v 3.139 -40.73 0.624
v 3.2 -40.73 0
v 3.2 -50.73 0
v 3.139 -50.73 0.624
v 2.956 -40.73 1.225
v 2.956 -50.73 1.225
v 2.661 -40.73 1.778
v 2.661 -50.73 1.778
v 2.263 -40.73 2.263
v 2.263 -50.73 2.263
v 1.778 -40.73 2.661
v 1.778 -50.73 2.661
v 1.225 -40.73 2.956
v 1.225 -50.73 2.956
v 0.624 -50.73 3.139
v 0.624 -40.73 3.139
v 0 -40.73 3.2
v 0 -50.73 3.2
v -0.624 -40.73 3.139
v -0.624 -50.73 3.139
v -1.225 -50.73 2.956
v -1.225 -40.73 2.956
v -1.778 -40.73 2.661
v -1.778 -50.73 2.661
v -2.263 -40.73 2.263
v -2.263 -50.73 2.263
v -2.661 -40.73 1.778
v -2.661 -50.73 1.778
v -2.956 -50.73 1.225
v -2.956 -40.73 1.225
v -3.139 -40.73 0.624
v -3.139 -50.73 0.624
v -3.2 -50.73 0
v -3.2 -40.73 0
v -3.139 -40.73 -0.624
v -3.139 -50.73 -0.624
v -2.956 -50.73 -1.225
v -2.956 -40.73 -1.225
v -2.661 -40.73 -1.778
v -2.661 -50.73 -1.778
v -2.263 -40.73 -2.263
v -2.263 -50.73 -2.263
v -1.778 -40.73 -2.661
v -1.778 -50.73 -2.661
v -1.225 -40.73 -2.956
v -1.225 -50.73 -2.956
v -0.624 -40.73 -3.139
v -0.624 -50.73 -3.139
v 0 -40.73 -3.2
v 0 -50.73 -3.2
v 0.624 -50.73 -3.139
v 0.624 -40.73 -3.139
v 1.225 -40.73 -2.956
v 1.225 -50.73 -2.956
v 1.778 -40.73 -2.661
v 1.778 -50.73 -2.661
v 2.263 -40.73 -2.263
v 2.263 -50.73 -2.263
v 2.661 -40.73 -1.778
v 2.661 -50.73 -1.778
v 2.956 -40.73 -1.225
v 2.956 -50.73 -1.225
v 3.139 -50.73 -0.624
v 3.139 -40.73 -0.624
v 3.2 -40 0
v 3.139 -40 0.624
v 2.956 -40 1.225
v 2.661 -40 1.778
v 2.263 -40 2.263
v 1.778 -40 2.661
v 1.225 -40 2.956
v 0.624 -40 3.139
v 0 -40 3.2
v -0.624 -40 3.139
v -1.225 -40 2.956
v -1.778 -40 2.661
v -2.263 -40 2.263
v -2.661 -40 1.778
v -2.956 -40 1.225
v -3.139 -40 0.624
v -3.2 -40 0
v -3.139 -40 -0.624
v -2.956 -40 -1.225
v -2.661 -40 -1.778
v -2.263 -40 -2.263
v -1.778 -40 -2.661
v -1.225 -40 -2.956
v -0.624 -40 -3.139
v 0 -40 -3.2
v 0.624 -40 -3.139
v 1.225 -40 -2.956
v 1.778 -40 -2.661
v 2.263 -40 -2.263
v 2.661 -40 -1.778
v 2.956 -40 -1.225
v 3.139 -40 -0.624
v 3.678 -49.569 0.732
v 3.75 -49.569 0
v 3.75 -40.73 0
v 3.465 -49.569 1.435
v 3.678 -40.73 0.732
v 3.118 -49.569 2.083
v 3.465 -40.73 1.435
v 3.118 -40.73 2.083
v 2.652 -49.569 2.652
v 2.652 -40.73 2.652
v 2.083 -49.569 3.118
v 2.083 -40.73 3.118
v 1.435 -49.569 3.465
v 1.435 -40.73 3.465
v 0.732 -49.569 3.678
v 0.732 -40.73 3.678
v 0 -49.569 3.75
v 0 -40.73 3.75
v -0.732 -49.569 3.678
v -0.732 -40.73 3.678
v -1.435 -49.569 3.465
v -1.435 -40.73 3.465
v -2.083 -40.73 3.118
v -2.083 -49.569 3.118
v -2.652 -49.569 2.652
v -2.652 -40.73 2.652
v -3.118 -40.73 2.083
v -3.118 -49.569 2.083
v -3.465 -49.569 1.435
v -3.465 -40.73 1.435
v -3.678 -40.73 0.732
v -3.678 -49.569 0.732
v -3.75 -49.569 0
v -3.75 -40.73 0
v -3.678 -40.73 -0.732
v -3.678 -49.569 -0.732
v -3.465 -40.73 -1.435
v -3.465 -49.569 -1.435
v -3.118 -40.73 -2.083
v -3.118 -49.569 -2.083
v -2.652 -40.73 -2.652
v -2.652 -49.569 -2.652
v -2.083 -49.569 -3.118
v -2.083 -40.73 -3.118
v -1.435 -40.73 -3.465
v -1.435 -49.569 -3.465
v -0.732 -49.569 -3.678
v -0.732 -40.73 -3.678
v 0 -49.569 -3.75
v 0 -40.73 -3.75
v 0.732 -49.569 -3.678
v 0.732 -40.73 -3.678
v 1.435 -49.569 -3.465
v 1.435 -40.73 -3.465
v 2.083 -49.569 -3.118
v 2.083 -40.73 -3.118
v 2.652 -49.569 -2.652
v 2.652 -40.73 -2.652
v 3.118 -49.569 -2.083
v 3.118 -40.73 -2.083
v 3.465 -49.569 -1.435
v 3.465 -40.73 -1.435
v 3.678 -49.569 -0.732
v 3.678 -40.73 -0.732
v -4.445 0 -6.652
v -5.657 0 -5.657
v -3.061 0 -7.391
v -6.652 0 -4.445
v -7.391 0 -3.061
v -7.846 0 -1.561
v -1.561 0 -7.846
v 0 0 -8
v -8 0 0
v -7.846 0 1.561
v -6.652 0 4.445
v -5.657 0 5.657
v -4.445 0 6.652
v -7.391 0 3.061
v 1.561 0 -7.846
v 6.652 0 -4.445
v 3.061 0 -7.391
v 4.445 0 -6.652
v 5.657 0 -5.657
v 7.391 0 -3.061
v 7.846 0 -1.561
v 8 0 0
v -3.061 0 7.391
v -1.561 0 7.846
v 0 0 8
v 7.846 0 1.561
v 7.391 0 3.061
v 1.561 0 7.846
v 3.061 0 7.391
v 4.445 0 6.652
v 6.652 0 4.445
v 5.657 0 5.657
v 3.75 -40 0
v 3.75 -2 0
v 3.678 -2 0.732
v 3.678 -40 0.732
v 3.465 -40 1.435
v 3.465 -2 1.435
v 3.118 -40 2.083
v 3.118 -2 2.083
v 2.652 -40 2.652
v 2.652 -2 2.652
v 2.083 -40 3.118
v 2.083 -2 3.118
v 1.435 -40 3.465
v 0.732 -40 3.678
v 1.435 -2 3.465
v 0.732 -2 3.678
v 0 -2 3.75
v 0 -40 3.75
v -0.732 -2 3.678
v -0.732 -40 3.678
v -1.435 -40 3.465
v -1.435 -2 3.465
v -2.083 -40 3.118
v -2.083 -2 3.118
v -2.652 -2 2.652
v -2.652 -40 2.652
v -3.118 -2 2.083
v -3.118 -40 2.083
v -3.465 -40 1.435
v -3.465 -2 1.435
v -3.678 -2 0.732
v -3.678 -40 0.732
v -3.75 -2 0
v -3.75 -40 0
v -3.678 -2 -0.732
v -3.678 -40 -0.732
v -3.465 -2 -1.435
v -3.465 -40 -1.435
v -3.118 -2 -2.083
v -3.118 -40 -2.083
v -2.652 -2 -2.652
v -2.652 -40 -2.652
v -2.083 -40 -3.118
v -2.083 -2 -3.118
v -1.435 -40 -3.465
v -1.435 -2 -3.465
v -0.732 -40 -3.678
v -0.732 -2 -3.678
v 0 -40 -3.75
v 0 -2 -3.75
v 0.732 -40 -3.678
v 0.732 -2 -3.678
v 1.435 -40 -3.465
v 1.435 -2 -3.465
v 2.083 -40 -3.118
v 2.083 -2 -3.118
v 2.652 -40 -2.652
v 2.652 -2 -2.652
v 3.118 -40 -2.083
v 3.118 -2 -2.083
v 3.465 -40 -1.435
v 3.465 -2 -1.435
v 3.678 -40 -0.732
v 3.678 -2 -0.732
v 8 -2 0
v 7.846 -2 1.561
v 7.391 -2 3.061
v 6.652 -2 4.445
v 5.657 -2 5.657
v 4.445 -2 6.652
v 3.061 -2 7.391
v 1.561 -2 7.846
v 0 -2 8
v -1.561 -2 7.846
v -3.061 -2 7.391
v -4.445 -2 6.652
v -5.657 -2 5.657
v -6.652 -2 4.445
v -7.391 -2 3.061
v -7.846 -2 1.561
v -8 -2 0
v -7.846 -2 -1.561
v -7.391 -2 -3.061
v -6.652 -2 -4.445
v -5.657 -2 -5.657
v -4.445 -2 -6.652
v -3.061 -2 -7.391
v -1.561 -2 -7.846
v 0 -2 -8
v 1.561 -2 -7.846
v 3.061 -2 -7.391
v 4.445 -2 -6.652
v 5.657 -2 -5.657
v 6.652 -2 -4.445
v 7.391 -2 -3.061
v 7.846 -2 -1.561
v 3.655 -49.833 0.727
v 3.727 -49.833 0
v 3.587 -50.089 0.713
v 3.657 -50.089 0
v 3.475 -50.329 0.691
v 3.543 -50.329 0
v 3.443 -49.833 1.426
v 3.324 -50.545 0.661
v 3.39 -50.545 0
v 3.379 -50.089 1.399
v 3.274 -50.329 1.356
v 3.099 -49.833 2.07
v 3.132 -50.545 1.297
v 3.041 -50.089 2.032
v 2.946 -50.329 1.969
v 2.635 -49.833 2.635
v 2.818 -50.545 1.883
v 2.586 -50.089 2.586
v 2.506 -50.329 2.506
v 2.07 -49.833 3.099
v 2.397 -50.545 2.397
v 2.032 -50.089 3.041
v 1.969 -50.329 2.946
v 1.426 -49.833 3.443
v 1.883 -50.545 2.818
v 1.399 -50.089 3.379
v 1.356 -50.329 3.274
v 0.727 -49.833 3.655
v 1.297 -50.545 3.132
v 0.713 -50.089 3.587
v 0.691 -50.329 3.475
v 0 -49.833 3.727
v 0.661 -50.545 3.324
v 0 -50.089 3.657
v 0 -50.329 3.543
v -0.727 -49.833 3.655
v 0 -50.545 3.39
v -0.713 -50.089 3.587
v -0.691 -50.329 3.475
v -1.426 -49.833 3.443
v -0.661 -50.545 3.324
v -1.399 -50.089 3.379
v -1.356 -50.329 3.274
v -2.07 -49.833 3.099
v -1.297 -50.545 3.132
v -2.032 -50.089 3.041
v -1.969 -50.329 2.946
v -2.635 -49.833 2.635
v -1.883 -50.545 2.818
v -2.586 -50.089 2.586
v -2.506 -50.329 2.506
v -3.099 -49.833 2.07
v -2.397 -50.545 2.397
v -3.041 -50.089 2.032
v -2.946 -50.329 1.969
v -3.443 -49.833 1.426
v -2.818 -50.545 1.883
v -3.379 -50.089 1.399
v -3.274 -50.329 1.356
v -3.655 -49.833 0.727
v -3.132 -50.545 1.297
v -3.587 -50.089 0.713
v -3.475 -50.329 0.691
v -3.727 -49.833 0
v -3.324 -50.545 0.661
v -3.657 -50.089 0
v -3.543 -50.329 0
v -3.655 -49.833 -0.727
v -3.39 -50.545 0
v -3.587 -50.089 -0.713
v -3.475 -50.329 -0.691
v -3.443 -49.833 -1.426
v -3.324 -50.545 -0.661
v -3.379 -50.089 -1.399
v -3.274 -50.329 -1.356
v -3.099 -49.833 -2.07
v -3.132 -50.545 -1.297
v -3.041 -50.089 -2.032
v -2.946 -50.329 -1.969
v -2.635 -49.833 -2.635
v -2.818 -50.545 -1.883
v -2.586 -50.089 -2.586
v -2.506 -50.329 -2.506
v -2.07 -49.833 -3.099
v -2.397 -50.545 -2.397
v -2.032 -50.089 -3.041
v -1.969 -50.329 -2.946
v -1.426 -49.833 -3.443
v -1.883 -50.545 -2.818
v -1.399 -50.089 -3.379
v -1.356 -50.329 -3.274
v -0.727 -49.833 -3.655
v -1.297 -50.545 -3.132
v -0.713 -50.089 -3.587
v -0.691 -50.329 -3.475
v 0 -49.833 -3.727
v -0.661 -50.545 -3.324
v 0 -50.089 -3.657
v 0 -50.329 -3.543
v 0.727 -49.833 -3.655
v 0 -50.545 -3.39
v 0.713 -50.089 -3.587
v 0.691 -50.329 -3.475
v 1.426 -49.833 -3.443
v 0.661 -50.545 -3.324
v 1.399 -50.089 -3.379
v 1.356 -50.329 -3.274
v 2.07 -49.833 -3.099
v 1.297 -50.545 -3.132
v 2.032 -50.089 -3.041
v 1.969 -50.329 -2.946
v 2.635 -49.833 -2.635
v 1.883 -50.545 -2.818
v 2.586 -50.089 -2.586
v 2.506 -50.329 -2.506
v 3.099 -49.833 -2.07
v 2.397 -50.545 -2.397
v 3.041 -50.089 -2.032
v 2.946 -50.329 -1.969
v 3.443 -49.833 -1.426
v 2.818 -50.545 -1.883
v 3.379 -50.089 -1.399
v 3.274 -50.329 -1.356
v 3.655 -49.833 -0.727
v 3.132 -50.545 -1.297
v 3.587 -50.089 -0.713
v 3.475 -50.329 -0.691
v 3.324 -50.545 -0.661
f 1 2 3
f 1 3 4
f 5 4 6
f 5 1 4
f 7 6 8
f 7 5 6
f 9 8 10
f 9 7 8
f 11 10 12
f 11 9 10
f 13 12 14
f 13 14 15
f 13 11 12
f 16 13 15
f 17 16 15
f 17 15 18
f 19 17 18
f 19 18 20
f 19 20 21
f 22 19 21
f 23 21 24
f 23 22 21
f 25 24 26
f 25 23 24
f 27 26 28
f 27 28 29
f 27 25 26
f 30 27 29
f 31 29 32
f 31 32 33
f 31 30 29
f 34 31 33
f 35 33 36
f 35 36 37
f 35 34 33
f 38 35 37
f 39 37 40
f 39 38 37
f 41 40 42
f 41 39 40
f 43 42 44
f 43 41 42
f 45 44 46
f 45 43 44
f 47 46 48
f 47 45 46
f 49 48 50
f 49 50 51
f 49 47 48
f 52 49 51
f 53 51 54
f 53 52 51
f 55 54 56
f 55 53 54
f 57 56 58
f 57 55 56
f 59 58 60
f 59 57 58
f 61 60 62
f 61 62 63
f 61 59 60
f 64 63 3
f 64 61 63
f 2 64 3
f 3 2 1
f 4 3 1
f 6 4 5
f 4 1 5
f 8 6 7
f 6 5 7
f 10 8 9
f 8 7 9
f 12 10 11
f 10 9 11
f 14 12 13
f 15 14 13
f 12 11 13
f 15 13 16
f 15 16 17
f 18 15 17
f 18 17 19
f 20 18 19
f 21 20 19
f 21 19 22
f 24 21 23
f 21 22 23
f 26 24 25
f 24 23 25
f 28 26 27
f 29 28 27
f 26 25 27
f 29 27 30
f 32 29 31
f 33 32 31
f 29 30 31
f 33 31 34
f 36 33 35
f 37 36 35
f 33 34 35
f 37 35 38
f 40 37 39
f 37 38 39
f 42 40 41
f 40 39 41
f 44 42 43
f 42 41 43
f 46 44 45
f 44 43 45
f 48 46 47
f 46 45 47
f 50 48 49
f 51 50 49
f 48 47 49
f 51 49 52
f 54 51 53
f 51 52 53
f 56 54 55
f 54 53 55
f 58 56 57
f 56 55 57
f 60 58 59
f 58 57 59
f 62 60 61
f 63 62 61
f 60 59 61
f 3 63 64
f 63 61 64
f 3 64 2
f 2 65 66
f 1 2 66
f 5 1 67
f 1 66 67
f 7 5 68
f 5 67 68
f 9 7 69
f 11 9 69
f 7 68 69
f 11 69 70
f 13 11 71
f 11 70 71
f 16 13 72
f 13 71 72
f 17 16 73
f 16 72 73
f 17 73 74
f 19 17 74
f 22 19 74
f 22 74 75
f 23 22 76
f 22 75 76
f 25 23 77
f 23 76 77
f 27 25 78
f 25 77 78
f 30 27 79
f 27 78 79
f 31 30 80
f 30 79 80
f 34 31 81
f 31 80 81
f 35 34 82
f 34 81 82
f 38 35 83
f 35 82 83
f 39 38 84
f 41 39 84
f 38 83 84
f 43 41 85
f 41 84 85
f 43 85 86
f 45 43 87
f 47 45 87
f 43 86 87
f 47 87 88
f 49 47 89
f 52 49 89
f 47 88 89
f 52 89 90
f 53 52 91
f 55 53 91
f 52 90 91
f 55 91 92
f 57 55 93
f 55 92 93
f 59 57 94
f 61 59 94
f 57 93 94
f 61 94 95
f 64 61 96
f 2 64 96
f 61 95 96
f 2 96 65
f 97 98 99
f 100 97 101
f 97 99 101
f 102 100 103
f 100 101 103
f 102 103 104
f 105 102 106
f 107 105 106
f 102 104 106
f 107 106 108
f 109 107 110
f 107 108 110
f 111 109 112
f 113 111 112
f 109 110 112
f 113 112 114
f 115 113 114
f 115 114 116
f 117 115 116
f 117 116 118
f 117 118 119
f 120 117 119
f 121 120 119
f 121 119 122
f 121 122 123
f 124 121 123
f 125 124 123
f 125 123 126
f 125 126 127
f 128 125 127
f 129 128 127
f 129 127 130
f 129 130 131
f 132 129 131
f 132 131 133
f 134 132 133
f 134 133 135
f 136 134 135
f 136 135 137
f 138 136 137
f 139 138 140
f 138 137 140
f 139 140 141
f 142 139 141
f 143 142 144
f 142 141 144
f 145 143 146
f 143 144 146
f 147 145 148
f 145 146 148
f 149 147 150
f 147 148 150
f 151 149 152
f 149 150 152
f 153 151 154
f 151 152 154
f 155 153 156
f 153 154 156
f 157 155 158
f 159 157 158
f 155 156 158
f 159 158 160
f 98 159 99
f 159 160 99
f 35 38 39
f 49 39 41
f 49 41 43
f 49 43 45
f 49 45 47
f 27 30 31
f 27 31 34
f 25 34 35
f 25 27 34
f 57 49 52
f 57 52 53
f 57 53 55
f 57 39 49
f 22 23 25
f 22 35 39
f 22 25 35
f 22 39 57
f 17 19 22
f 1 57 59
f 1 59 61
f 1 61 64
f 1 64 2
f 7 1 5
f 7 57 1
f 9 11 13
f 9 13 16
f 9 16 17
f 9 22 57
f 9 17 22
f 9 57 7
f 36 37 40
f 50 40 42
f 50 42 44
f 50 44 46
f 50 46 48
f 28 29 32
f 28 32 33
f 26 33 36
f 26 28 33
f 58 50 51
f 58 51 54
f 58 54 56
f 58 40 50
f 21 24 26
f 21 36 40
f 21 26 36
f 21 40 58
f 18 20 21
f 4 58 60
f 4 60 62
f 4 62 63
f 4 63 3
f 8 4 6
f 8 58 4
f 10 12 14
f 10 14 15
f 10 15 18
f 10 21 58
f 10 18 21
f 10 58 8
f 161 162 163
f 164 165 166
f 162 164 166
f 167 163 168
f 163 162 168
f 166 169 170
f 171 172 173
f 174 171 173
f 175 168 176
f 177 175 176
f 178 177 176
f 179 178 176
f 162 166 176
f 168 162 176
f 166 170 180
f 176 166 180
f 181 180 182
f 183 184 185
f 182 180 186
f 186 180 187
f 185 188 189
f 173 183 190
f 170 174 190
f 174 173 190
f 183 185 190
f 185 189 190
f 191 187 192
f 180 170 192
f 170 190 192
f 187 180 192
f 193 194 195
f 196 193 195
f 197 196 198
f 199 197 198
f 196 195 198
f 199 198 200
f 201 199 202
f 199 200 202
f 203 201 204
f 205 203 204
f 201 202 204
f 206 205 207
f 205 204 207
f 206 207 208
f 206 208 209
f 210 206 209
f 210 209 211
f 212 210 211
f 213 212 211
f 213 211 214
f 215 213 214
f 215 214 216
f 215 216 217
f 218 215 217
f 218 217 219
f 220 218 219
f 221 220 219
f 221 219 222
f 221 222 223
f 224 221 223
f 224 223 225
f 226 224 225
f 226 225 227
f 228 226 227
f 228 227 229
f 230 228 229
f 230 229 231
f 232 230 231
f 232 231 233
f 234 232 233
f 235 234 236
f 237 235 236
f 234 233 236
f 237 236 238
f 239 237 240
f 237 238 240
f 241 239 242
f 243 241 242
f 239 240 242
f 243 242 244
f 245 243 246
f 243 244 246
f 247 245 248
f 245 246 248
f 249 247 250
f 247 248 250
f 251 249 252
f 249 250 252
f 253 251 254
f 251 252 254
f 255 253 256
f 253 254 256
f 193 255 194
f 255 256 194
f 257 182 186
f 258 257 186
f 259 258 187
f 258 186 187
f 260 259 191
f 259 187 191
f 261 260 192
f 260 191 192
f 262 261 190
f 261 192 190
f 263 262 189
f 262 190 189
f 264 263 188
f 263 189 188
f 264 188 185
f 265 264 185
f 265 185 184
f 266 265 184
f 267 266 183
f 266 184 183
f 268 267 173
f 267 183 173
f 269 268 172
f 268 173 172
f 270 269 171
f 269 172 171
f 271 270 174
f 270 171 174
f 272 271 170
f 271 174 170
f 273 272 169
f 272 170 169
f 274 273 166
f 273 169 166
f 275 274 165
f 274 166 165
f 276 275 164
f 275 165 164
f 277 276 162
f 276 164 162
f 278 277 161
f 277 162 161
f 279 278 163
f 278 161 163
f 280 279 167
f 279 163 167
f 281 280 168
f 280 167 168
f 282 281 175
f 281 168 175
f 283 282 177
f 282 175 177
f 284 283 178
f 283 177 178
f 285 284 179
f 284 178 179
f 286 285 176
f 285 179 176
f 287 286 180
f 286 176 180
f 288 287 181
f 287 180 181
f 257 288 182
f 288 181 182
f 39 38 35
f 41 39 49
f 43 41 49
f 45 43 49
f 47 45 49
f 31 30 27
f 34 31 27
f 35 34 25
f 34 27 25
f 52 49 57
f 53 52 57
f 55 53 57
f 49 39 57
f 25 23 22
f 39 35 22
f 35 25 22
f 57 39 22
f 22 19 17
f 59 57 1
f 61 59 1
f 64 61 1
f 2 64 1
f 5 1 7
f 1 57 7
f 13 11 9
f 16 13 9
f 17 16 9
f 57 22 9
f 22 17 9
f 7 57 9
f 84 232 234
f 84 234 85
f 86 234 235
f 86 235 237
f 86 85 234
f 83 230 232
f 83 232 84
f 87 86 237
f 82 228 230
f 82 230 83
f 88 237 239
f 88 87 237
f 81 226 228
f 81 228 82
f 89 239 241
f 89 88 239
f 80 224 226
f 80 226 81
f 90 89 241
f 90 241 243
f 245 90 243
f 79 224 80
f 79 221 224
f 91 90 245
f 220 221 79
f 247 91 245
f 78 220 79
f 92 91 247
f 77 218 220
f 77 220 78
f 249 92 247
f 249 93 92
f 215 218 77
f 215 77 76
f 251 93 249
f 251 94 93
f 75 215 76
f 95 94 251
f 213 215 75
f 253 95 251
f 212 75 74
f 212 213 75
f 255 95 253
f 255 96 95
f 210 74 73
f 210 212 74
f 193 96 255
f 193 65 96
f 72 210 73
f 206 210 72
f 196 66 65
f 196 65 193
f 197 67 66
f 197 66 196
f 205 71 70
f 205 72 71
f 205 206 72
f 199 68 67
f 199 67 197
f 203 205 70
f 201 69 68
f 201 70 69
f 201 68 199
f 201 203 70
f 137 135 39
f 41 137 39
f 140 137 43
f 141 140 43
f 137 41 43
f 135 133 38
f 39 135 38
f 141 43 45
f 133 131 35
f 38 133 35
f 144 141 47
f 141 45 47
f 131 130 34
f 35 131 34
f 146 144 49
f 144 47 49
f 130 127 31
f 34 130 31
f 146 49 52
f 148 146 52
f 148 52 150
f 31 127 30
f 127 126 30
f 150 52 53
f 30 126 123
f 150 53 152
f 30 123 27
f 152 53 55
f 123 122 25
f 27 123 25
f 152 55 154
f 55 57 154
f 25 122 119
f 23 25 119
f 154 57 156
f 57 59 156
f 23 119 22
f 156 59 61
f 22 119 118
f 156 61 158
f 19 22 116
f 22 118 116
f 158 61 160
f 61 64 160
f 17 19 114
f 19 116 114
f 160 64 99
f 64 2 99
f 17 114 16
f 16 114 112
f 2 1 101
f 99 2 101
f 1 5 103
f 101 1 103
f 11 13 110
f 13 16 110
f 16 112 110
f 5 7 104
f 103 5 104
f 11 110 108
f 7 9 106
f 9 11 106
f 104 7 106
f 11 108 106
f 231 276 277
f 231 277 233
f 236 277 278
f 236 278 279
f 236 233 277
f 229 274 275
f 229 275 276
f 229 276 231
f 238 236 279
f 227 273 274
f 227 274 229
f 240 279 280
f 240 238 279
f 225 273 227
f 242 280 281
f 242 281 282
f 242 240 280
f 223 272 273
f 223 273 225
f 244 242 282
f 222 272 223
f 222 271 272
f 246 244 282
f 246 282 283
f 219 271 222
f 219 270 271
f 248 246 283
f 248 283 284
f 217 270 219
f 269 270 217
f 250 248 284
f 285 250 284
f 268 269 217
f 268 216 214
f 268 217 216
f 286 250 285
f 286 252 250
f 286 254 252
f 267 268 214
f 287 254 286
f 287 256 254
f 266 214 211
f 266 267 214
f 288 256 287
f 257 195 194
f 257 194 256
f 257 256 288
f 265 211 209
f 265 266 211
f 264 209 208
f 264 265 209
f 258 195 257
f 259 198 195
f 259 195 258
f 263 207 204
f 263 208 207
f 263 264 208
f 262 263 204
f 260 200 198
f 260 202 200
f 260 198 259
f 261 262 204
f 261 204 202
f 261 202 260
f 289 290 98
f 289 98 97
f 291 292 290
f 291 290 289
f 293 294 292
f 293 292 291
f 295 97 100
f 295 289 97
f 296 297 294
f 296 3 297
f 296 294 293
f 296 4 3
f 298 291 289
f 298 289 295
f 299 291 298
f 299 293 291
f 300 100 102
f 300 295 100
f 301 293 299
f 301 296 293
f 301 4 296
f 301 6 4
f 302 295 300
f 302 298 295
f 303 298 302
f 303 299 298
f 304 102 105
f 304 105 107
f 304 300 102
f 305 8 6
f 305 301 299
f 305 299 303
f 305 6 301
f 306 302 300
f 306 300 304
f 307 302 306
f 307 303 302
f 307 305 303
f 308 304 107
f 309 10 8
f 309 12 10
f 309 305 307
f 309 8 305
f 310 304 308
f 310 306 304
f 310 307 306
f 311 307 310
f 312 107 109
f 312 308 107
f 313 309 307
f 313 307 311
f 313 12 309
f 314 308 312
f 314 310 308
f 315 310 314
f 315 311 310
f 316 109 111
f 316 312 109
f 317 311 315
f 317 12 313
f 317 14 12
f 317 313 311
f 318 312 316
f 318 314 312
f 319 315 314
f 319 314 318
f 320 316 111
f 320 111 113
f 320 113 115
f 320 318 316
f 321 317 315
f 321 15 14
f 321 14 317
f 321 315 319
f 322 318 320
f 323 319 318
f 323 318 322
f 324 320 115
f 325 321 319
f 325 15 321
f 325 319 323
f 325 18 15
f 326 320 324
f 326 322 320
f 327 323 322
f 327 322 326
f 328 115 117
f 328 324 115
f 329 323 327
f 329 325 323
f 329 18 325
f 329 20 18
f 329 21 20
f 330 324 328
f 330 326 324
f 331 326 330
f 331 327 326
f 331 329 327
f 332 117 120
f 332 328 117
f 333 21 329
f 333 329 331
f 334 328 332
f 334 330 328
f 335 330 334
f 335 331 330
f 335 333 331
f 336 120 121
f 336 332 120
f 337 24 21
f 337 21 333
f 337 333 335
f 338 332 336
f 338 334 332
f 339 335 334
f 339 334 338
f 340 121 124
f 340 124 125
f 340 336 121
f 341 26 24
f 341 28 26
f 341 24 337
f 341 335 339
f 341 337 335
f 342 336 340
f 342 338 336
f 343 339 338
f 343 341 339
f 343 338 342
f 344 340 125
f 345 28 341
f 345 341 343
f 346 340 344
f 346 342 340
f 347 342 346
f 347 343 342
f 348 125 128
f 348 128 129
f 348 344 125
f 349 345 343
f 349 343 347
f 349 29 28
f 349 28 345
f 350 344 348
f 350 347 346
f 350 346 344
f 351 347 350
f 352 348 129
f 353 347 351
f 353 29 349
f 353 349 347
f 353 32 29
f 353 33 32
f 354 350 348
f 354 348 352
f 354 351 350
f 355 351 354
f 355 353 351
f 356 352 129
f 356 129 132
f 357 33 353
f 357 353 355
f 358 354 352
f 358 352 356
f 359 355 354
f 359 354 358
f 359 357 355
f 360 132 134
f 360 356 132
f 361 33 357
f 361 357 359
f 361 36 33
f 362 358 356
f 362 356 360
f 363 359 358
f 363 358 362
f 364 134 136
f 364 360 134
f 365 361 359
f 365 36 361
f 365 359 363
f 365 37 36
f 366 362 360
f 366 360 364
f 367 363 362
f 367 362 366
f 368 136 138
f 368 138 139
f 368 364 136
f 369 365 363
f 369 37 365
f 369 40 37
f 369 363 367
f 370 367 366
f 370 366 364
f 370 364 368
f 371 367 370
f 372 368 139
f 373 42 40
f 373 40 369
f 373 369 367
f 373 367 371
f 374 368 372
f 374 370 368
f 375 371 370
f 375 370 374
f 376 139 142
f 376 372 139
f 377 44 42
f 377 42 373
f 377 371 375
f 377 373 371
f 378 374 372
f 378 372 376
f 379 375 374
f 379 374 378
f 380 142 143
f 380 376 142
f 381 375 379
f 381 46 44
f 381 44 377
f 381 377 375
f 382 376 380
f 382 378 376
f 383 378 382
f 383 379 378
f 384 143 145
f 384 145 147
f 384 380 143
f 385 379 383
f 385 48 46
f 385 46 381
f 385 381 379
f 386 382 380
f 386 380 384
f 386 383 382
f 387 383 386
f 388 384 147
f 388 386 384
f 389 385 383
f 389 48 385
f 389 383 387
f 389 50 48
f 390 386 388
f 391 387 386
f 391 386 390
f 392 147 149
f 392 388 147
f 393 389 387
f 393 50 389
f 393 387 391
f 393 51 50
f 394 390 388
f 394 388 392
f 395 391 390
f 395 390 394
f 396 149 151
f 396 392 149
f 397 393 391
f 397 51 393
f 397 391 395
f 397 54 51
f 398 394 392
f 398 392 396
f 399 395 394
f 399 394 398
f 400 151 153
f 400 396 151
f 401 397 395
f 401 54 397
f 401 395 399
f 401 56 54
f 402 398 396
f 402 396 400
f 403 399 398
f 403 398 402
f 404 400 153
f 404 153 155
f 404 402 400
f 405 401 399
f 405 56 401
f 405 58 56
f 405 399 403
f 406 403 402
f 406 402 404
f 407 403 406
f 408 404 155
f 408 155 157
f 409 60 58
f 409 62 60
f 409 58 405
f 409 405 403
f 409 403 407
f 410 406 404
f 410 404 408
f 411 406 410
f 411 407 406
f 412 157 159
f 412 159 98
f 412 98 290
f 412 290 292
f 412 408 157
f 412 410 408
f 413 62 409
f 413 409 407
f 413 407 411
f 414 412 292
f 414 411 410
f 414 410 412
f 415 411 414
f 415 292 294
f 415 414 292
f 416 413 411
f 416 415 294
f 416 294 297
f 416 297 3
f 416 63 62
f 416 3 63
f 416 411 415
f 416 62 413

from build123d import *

# Parameters (mm, degrees)
F0_R     = 3.75
F1_DEPTH = 40
F0_R_2   = 8
F2_DEPTH = 2
F3_R     = 3.2
F4_DEPTH = 0.73
F5_R     = 3.75
F5_R_2   = 3.2
F6_DEPTH = 10
F7_DEPTH = 10


# Not quite as in the source:
# - a fillet or chamfer that OpenCascade refuses, or shapes differently, is made with other operations: its cross-section is extruded or revolved along the edge and cut away or added


with BuildPart() as f1:
    # F0 (on Front) → F1 (new body)
    with BuildSketch(Plane.XZ):
        Circle(F0_R)
    extrude(amount=F1_DEPTH)

    # F0 (on Front) → F2 (join)
    with BuildSketch(Plane.XZ):
        Circle(F0_R_2)
        Circle(F0_R, mode=Mode.SUBTRACT)
    extrude(amount=F2_DEPTH)

    # F3 (on face) → F4 (join)
    with BuildSketch(Plane.XZ.offset(40)):
        Circle(F3_R)
    extrude(amount=F4_DEPTH)


with BuildPart() as f6:
    # F5 (on face) → F6 (new body)
    with BuildSketch(Plane.XZ.offset(40.73)):
        Circle(F5_R)
        Circle(F5_R_2, mode=Mode.SUBTRACT)
    extrude(amount=F6_DEPTH)

    # F8: fillet of radius 1.5 on 1 edges, made by hand

    # F8_s1 → F8_t2 (revolve, cut)
    with BuildSketch(Plane.XY):
        with BuildLine():
            ThreePointArc((3.75, -49.5691813234), (3.6055441712, -50.2114429523), (3.2, -50.73))
            Line((3.2, -50.73), (3.75, -50.73))
            Line((3.75, -50.73), (3.75, -49.5691813234))
        make_face()
    revolve(axis=Axis((0, -50.73, 0), (0, -1, 0)), mode=Mode.SUBTRACT)


with BuildPart() as f7:
    # F7 (new): a face of the model
    f7_faces = [f1.part.faces().sort_by_distance(p)[0] for p in [
        (0, -40.73, 0),
    ]]
    extrude(f7_faces, amount=F7_DEPTH)


solid = Compound([f1.part, f6.part, f7.part])
